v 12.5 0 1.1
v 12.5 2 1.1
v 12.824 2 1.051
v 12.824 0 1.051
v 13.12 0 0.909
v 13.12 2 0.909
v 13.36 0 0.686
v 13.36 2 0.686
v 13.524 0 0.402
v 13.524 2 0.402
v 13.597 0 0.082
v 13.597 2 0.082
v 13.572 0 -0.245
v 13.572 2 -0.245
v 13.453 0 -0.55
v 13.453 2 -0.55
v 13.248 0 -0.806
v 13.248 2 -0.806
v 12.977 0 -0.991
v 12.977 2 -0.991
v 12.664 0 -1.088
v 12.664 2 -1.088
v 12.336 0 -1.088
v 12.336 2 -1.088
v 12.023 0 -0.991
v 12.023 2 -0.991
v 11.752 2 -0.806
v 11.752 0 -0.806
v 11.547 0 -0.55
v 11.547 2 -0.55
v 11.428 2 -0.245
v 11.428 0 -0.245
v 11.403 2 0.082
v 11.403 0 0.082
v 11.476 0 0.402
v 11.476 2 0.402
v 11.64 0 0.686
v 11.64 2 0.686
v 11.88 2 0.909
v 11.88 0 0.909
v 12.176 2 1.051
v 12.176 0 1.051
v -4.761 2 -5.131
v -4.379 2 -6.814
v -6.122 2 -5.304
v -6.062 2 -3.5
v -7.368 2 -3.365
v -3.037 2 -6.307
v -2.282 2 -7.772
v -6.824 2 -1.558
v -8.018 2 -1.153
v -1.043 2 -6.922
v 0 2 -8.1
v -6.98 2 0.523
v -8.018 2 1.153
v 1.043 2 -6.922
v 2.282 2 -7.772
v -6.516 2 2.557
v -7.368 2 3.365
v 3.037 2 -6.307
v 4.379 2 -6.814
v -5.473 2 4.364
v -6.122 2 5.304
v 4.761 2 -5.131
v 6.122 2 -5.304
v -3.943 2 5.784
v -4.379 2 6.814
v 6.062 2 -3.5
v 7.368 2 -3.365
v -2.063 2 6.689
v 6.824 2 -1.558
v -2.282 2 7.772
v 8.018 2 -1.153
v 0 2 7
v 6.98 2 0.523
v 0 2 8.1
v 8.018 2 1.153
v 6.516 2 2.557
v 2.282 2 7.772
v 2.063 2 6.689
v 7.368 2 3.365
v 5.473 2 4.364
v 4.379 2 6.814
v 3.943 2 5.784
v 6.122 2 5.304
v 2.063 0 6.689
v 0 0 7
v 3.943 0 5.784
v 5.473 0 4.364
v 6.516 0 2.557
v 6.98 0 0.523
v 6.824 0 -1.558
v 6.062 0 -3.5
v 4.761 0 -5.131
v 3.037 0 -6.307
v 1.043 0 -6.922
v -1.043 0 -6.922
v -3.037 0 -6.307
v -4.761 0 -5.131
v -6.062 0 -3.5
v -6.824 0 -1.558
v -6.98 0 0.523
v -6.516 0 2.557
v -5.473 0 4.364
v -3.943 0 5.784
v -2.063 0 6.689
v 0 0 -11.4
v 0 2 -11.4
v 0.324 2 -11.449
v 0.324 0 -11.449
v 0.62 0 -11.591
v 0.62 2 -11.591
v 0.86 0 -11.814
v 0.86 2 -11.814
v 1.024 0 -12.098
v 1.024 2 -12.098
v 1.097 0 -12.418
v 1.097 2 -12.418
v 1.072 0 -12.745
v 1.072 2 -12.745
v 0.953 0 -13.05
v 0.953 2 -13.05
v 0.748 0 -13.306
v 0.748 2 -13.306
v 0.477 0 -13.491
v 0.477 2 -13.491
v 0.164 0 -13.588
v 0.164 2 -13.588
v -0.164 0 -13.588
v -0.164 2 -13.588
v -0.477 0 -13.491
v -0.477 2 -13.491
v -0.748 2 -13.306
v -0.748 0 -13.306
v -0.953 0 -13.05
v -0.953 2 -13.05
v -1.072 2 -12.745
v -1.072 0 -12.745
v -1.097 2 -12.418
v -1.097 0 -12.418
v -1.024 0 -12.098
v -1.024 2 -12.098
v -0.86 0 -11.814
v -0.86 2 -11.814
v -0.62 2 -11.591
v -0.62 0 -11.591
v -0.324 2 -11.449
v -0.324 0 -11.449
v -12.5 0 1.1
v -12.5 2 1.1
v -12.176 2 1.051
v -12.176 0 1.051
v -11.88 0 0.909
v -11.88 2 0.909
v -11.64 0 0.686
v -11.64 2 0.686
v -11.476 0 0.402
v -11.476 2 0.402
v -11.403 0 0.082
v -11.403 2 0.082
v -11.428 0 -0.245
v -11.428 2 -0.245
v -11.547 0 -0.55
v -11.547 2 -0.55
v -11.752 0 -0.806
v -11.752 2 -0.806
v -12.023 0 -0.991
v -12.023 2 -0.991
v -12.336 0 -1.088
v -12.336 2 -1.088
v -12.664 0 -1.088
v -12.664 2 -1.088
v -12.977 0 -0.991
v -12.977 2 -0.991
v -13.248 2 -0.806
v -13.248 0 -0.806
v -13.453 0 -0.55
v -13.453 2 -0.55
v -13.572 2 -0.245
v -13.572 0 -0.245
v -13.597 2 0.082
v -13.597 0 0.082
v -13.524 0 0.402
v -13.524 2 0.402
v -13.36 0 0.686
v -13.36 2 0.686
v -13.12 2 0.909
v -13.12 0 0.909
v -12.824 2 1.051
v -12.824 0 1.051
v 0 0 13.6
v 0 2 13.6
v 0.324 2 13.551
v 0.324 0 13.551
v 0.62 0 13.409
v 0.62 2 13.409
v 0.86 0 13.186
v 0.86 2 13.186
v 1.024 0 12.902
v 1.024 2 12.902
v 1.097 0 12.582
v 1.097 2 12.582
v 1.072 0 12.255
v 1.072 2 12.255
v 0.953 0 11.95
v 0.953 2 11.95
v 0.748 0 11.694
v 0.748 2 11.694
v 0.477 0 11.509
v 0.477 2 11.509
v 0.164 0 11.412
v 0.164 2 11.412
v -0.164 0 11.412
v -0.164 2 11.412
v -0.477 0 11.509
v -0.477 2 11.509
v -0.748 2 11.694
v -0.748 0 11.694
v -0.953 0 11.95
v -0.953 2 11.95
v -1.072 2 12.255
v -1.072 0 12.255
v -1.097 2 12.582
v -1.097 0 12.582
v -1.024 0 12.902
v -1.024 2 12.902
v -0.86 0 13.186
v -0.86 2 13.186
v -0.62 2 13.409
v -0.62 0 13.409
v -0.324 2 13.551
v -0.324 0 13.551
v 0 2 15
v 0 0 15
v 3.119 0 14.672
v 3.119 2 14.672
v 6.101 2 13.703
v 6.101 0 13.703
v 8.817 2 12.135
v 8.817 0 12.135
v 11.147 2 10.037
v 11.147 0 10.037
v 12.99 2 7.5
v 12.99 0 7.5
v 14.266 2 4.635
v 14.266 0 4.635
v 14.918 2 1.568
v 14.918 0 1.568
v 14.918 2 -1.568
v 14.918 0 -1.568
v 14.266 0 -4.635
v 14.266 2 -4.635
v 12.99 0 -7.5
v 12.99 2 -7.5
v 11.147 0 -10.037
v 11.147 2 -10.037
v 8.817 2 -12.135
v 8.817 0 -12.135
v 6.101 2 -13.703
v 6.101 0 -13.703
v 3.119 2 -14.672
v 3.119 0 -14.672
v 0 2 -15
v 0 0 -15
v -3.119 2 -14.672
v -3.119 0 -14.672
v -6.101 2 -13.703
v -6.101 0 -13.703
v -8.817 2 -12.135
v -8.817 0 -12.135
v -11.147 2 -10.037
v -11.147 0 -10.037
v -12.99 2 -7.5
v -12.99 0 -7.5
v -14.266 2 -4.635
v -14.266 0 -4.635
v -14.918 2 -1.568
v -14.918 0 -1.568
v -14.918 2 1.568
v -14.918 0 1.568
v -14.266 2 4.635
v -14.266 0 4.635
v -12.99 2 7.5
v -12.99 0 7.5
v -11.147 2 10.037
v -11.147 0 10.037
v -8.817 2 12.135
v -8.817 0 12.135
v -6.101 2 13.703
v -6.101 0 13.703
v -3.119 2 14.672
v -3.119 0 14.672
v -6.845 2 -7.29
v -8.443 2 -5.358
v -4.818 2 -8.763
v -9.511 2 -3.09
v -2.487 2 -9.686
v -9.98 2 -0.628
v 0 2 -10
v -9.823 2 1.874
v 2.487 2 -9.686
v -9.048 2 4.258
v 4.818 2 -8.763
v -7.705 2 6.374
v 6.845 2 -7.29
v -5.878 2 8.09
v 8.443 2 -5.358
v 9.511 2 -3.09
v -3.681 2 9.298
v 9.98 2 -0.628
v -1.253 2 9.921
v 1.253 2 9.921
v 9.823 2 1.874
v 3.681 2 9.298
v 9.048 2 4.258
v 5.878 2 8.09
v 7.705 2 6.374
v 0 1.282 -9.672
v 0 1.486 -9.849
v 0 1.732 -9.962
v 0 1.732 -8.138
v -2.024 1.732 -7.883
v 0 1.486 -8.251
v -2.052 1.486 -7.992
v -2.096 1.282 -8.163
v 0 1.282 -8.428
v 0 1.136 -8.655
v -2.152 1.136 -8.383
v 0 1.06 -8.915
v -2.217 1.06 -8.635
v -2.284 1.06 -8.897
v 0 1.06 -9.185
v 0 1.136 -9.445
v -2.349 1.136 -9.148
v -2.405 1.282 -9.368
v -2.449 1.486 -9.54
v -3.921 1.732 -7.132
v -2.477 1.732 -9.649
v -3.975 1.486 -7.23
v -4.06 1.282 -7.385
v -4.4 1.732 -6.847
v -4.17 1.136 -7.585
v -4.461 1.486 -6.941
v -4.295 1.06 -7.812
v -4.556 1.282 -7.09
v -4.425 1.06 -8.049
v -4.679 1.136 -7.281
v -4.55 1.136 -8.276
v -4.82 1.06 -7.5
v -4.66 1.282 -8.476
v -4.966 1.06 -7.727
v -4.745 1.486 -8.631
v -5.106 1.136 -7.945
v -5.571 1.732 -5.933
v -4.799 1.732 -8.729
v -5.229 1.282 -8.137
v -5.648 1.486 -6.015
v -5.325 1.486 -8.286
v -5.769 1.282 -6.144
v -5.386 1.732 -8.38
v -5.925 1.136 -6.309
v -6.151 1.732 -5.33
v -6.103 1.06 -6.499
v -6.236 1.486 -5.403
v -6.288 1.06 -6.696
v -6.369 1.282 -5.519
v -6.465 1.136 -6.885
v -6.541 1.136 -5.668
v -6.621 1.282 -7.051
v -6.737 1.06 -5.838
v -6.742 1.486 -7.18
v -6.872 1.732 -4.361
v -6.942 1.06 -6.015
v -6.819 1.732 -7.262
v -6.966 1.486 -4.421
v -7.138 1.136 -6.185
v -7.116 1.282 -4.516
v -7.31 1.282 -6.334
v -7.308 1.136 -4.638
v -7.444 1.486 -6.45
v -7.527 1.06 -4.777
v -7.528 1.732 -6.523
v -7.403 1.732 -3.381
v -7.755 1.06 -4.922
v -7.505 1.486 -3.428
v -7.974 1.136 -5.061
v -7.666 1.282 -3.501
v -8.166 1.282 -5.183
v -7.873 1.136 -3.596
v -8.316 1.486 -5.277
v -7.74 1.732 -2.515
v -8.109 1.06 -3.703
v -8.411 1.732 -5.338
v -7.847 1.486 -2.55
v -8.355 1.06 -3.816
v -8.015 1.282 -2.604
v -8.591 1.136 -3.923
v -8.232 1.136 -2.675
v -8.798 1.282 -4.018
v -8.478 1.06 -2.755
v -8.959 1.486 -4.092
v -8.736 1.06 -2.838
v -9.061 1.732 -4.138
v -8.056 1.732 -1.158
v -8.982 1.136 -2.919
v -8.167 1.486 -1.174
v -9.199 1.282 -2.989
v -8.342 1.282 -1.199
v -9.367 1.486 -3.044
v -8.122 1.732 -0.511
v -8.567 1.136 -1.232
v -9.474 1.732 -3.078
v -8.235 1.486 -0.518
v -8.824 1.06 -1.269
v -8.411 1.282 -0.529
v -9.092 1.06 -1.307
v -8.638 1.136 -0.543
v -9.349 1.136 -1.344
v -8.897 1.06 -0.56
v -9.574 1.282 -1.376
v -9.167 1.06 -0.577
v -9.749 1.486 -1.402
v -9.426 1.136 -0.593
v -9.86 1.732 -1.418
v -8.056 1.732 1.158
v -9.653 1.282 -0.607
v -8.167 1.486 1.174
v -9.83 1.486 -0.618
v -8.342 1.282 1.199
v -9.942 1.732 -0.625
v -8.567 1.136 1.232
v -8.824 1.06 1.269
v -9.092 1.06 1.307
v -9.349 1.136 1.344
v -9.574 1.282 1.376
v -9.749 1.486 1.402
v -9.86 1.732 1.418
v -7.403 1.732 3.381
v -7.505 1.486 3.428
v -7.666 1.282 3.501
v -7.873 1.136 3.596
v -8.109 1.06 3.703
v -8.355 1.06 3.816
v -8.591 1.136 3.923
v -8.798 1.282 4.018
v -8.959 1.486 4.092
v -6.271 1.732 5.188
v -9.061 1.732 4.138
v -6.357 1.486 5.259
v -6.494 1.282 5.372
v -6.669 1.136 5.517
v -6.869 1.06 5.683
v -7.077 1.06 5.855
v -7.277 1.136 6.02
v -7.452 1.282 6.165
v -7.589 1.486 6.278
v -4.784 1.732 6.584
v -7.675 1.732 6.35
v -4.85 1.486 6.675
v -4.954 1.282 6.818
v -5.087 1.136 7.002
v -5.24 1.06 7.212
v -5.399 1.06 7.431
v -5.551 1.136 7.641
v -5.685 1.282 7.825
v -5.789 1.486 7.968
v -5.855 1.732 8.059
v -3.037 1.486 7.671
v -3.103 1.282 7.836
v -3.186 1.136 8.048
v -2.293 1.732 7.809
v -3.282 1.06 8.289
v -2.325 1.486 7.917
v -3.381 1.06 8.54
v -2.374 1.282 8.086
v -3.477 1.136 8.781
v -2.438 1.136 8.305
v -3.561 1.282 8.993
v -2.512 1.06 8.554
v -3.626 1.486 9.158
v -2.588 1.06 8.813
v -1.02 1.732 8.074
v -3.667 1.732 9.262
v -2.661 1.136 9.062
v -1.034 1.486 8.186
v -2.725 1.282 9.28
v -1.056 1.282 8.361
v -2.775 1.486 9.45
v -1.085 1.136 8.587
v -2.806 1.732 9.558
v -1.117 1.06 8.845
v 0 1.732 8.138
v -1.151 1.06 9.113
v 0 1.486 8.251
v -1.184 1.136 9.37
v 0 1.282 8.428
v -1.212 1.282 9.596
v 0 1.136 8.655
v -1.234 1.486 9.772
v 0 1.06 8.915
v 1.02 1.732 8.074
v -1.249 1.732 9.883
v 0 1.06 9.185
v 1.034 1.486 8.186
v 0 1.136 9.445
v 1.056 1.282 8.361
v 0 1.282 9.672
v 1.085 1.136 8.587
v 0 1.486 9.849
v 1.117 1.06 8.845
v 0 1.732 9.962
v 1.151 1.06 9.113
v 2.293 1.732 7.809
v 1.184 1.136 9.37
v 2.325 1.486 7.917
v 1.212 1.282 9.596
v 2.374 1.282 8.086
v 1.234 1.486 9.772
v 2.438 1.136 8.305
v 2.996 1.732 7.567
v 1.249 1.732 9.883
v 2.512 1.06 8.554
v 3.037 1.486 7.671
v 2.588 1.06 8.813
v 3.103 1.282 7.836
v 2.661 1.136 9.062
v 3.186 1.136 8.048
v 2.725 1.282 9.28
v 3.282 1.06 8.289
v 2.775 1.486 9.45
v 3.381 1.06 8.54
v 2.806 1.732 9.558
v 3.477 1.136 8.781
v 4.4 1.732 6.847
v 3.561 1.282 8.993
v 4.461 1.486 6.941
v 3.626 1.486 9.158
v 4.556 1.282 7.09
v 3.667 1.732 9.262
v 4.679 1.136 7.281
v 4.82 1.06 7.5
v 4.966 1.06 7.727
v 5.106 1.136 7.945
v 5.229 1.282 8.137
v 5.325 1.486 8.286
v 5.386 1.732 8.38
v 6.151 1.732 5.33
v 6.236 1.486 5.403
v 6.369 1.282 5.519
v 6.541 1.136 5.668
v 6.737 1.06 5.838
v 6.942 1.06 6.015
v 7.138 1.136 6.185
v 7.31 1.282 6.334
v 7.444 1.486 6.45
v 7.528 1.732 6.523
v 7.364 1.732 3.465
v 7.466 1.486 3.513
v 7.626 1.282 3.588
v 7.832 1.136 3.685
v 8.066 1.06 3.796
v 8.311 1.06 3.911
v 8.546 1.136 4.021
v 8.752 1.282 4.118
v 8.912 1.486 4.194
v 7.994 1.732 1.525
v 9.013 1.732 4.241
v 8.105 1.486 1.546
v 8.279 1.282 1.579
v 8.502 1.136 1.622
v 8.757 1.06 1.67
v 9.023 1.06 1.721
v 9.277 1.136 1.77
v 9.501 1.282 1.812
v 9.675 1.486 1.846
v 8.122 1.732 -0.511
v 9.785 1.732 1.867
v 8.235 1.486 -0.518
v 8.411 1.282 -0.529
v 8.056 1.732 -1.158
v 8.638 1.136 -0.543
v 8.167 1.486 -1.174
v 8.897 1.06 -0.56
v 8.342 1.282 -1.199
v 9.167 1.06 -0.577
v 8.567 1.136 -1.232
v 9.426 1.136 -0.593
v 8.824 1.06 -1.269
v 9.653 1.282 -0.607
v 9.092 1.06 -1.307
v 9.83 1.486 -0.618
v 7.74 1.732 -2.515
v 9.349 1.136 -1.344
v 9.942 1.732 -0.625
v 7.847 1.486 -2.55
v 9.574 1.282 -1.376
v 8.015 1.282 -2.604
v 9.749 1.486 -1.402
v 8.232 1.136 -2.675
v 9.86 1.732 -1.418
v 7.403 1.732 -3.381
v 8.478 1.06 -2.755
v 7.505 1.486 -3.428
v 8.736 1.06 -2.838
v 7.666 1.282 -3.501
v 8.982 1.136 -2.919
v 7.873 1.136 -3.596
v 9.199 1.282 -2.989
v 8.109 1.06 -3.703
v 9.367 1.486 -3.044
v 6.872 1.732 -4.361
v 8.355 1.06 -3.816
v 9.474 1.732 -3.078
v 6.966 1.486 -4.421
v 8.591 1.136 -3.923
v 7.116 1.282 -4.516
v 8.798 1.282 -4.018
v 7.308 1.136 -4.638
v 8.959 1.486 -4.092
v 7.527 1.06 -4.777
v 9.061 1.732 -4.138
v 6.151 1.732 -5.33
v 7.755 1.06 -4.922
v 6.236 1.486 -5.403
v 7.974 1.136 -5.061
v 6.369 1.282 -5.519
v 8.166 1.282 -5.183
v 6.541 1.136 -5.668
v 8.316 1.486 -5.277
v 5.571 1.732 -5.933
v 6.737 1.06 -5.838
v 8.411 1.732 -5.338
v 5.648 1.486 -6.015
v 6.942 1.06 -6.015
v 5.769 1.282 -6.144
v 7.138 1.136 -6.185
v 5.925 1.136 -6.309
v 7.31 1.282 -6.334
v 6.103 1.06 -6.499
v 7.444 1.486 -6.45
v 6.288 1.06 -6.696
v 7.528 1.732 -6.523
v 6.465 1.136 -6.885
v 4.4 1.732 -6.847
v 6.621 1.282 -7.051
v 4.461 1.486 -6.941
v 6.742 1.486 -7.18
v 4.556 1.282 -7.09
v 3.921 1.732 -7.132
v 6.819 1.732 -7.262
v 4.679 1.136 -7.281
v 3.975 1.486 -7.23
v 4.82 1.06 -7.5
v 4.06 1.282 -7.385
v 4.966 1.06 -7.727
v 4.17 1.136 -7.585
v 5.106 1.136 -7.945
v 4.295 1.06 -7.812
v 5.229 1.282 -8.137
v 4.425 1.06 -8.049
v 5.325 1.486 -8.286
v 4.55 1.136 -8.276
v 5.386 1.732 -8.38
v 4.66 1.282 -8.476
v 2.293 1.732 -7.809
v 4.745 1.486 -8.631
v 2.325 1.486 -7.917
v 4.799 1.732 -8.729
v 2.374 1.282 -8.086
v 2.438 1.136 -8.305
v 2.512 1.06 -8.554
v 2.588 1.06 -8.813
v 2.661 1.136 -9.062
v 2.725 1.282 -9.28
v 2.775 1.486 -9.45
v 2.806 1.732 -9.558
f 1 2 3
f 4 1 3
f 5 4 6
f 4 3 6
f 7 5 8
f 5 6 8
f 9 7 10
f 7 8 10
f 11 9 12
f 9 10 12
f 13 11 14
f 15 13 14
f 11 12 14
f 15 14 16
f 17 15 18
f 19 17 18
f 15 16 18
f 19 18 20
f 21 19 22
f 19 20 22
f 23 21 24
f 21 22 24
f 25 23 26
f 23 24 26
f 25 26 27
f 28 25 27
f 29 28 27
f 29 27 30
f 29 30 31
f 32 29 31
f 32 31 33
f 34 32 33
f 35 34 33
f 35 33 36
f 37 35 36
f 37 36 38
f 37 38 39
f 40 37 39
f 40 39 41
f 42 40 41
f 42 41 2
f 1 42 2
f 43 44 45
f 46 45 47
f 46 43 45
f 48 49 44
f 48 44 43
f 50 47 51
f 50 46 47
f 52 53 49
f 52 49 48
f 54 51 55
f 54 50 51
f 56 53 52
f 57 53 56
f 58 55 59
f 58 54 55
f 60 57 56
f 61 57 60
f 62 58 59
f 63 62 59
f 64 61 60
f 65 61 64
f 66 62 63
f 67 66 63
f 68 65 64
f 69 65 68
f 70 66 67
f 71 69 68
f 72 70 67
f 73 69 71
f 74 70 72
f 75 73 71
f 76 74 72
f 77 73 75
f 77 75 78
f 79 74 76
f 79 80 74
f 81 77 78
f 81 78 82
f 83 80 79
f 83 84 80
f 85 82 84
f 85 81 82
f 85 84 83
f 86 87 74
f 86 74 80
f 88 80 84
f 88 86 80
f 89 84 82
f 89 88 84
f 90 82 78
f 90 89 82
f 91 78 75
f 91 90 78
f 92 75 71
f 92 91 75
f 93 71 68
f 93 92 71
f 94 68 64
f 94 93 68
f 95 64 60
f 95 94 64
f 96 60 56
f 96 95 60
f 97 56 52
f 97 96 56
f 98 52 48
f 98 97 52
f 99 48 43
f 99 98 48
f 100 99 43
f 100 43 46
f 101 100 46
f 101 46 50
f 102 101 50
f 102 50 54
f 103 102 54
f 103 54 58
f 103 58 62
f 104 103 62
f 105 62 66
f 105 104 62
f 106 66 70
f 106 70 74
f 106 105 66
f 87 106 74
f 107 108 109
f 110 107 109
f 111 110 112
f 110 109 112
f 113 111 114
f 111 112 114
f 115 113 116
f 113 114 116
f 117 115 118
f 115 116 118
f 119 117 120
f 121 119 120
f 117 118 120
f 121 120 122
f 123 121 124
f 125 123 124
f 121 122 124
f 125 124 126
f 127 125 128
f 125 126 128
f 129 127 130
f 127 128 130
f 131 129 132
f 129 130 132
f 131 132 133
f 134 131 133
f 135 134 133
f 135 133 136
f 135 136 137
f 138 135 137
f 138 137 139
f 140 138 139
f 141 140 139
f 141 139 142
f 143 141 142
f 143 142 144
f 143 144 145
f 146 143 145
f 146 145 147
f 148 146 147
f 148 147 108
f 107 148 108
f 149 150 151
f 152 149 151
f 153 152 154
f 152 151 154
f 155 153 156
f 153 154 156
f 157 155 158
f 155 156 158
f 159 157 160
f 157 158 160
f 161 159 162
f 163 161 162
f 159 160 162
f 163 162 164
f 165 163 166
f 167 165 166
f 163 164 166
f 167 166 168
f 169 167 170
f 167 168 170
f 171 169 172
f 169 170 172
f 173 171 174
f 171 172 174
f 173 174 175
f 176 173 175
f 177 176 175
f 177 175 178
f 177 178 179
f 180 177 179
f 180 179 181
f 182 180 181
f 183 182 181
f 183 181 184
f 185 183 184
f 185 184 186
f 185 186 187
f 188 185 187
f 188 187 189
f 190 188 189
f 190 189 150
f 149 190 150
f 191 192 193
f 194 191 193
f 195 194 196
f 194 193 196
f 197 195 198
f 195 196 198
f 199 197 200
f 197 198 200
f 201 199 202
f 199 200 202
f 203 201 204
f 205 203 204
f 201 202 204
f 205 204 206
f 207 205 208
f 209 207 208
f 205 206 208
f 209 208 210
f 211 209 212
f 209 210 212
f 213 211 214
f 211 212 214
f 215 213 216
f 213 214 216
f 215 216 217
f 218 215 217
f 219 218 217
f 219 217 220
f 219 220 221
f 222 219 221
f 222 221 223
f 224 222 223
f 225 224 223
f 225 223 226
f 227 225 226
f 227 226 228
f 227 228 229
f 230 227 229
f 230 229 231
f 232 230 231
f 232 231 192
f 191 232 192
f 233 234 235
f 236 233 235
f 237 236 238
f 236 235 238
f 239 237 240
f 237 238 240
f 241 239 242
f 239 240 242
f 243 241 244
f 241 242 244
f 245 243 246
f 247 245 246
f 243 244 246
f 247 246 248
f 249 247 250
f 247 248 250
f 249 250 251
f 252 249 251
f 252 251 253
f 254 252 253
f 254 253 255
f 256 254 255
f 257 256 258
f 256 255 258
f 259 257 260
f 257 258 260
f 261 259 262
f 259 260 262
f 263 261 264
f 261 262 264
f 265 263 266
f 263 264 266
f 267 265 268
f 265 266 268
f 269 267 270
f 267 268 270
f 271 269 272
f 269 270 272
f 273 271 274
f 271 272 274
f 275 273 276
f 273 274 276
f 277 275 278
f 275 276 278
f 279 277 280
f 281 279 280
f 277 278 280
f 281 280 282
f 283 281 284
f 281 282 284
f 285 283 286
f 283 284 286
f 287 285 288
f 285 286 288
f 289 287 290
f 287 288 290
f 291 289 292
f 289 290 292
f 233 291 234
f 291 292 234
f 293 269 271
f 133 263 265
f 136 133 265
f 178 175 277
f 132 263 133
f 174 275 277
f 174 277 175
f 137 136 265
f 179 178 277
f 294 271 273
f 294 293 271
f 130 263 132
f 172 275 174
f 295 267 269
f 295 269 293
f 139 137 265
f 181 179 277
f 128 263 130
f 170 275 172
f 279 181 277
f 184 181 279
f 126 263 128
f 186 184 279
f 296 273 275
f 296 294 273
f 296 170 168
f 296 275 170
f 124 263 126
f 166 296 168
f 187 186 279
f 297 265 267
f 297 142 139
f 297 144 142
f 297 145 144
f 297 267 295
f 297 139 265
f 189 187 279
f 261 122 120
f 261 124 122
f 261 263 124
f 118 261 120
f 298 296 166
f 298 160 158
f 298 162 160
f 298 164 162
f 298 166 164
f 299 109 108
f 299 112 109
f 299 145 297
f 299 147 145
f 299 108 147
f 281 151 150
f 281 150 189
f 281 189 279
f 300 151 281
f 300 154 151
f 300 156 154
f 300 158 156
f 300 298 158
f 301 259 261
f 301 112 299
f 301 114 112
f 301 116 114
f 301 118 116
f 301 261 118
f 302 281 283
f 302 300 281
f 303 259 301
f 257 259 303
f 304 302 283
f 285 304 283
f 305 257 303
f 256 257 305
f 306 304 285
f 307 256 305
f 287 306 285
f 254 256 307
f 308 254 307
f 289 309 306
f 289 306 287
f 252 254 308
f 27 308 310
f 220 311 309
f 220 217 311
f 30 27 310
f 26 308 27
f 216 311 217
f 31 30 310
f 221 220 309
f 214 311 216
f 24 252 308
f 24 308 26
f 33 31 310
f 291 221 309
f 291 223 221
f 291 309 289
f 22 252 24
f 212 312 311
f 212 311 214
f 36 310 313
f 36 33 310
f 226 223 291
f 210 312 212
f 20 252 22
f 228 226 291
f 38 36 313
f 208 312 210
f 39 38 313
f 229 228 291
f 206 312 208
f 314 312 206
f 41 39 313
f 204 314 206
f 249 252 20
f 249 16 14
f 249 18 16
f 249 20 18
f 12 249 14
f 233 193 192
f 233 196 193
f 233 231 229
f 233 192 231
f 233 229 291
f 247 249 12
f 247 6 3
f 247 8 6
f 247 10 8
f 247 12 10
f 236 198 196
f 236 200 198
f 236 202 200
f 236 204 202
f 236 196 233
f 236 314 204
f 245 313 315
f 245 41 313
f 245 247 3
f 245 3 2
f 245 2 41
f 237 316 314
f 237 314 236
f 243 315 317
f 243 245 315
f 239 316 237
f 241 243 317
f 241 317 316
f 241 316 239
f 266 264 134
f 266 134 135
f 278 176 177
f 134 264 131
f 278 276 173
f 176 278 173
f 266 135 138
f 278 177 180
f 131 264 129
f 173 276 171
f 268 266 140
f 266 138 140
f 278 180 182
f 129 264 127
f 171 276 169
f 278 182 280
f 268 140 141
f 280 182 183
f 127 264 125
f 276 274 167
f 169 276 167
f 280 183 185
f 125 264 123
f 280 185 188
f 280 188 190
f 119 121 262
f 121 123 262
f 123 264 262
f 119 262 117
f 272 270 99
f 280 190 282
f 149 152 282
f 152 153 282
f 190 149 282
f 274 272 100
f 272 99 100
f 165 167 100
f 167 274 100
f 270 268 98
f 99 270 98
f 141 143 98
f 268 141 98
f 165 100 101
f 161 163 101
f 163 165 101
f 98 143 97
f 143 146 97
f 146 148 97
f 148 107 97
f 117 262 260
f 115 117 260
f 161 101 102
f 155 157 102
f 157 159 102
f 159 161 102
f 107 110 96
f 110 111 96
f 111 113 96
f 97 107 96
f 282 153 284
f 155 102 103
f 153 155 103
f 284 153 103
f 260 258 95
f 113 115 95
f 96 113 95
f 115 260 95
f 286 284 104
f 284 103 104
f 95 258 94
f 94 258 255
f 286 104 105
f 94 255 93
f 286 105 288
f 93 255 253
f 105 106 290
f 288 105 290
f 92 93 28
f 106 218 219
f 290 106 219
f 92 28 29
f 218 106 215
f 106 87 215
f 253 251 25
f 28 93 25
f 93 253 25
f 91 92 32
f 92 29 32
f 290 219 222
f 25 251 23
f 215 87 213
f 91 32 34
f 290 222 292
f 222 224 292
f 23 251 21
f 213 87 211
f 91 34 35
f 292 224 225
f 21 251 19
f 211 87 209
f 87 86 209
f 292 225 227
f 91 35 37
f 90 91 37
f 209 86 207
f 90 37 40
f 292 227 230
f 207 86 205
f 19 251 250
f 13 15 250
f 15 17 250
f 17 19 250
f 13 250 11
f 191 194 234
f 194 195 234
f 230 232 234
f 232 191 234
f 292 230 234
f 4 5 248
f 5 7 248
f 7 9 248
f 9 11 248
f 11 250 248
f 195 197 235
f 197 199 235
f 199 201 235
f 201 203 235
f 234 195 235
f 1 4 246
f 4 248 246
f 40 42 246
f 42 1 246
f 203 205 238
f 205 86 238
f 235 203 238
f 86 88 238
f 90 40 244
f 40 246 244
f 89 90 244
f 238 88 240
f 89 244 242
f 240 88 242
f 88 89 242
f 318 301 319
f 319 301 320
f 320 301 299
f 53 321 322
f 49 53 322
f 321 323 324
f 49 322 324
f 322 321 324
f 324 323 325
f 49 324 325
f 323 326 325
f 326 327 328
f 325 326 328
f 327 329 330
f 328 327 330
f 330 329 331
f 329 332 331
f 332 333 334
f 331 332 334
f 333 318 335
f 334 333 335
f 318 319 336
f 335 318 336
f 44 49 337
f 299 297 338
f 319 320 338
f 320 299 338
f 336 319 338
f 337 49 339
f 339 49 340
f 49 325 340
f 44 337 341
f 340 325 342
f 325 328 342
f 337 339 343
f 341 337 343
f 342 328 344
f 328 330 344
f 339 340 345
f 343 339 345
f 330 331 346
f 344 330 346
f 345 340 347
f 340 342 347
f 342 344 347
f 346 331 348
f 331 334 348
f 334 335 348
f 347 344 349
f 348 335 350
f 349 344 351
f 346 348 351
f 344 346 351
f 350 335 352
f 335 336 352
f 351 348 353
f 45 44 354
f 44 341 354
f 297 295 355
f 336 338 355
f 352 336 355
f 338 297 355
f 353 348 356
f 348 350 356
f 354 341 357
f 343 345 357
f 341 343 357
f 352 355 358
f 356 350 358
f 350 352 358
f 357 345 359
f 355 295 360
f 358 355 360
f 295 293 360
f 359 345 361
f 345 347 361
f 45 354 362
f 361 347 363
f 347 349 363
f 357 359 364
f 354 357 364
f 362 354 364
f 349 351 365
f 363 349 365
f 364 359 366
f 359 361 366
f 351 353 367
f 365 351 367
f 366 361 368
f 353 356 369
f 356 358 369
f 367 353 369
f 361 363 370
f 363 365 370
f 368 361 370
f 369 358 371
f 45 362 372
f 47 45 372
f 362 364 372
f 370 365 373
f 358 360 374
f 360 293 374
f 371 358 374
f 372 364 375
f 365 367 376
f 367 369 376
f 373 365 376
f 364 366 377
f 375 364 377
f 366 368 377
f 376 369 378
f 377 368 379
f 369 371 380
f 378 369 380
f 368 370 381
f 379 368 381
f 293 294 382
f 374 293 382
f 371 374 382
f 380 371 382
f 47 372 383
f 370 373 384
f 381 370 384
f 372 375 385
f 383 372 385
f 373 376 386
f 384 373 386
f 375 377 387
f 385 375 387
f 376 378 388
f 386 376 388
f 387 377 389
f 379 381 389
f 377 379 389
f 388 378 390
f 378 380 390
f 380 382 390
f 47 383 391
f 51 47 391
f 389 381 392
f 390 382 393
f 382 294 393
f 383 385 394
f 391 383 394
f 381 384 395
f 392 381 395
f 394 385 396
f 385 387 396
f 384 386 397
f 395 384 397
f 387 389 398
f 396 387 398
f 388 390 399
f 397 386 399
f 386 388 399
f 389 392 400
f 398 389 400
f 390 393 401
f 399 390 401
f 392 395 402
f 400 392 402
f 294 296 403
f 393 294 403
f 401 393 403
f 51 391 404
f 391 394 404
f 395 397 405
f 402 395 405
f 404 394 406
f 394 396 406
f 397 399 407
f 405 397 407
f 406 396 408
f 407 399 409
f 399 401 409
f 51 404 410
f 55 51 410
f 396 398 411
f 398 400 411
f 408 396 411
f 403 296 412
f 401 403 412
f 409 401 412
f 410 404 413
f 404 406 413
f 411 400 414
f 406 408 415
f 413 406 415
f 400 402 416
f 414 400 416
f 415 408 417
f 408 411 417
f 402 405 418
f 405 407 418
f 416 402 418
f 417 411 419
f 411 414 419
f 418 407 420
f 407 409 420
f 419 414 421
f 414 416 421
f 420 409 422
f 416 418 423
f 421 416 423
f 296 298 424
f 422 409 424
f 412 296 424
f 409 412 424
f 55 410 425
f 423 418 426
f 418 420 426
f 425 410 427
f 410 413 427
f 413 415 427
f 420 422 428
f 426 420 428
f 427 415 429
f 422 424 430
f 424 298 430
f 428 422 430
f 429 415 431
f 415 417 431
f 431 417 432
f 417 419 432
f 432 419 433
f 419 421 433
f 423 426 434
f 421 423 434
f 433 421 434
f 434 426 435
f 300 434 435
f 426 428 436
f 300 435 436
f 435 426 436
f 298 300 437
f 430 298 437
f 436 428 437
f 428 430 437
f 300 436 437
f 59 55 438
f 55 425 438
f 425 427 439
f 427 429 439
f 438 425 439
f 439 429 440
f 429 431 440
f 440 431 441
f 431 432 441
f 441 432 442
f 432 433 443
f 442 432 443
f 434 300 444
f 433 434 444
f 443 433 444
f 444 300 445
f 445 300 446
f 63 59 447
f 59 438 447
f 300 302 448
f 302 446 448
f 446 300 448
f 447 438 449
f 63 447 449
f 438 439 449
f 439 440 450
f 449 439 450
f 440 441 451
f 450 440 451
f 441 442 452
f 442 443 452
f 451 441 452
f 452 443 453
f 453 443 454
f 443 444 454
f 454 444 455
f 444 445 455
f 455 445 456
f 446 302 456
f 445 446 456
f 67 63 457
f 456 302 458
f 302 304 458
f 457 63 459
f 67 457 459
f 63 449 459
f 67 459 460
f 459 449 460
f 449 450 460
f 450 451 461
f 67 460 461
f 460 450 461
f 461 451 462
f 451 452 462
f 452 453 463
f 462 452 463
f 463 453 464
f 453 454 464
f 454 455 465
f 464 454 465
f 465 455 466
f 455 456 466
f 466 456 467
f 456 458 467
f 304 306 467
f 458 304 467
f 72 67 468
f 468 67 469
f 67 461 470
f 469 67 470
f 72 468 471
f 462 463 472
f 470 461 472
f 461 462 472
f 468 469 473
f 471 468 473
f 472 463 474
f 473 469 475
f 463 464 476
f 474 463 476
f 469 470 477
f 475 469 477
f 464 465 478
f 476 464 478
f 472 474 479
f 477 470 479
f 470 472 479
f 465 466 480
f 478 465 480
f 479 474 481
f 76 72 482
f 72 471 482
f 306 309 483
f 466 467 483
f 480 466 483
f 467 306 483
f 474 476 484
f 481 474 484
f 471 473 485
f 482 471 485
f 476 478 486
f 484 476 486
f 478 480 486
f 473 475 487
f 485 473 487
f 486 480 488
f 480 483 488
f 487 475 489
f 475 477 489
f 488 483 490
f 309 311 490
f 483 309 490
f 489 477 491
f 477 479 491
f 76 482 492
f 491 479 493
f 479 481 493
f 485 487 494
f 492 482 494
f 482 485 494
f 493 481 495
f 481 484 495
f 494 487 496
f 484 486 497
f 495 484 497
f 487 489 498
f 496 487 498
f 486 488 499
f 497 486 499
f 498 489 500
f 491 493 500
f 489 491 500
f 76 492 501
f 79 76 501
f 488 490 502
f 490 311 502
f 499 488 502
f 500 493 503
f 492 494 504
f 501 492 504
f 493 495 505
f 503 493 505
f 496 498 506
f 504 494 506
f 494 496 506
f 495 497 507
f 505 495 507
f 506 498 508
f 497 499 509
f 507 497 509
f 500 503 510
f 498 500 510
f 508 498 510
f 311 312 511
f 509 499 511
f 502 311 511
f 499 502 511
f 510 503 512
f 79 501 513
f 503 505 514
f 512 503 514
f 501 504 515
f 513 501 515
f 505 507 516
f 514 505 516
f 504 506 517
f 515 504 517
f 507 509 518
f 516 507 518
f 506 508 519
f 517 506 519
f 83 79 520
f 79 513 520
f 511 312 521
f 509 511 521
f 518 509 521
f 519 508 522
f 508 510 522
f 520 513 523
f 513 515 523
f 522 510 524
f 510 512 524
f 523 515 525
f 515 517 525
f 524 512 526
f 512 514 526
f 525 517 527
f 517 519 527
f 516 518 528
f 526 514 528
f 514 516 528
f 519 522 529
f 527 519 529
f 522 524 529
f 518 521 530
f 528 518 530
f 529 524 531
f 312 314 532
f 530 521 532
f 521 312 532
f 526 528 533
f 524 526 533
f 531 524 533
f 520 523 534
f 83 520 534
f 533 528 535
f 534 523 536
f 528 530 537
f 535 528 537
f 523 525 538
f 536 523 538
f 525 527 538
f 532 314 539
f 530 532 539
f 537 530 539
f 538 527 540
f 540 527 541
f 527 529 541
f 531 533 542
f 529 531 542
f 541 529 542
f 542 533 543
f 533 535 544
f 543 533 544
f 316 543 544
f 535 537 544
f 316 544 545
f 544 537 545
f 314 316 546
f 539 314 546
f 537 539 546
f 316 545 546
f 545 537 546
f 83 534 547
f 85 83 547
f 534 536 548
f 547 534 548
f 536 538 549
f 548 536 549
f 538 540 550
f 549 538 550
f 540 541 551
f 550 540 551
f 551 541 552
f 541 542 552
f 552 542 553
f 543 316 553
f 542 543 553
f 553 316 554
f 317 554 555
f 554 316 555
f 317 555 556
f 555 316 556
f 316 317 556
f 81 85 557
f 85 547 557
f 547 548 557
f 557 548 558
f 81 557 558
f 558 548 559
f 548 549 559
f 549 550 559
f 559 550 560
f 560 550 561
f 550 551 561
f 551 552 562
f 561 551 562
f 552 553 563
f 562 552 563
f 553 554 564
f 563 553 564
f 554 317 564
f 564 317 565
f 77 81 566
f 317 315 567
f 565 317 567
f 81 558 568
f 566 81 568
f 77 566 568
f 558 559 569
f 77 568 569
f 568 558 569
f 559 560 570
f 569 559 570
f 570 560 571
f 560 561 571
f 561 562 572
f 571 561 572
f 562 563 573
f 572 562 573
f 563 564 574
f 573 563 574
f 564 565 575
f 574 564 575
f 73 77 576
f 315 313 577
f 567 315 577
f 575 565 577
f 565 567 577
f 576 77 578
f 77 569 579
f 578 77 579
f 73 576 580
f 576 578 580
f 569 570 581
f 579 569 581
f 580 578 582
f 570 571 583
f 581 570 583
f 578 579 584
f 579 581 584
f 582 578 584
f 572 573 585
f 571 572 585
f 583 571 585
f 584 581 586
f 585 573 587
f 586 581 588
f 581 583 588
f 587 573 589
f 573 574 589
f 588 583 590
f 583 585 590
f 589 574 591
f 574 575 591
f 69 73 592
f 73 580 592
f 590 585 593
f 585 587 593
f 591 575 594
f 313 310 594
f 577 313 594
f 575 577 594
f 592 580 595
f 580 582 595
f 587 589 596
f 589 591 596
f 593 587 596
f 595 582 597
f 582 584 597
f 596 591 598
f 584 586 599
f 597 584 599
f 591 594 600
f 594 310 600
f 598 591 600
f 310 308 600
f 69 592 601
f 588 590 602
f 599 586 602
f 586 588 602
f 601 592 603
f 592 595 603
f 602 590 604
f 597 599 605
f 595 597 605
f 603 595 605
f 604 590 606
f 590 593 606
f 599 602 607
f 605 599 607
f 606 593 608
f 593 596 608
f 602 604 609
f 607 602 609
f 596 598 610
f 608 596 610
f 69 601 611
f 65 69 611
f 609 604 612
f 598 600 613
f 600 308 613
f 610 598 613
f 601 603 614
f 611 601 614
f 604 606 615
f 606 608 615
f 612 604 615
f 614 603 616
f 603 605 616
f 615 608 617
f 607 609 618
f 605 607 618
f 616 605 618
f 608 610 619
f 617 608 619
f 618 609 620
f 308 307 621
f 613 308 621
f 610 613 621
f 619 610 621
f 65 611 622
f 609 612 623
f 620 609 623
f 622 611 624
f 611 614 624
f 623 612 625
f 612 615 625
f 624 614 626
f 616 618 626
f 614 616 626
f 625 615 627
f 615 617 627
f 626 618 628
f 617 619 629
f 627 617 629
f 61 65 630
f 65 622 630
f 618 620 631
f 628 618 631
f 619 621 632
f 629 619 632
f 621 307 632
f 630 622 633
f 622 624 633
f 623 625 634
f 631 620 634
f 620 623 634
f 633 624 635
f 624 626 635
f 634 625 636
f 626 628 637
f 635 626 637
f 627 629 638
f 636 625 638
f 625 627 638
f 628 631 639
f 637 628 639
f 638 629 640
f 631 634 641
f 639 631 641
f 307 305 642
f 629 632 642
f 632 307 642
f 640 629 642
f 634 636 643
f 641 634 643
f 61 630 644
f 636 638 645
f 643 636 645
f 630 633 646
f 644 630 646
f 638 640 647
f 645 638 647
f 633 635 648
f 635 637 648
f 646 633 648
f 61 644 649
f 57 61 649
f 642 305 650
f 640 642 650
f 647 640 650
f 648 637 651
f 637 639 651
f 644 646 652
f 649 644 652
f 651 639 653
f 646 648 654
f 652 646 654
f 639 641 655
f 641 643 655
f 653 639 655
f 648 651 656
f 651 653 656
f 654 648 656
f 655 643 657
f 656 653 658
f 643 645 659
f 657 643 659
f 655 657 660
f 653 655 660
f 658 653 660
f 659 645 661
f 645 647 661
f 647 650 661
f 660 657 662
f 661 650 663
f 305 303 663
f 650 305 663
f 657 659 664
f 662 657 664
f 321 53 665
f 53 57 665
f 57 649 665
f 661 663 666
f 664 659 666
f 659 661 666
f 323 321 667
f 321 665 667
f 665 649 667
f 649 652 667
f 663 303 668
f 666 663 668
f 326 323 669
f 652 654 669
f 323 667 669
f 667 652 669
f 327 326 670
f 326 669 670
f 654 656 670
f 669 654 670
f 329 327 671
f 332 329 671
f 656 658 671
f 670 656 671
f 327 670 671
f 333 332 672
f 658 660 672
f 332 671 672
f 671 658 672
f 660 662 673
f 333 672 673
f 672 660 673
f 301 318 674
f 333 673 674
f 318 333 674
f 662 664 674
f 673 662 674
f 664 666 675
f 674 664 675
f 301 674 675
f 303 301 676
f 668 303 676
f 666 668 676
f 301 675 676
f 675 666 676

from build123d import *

# Parameters (mm, degrees)
SKETCH_1_R          = 15
SKETCH_1_R_2        = 7
EXTRUDE_1_DEPTH     = 2
CUT_EXTRUDE_1_REACH = 23.307
SKETCH_2_R          = 1.1
SKETCH_3_R          = 0.95


with BuildPart() as part:
    # 草图1 → 凸台-拉伸1 (new body)
    with BuildSketch(Plane(origin=(0, 0, 0), x_dir=(1, 0, 0), z_dir=(0, 1, 0))):
        with Locations(Location((0, 0, 0), (0, 0, 270))):
            Circle(SKETCH_1_R)
        with Locations(Location((0, 0, 0), (0, 0, 270))):
            Circle(SKETCH_1_R_2, mode=Mode.SUBTRACT)
    extrude(amount=EXTRUDE_1_DEPTH)

    # 草图2 → 切除-拉伸1 (cut, up to next)
    with BuildSketch(Plane(origin=(0, 2, 0), x_dir=(1, 0, 0), z_dir=(0, 1, 0)), mode=Mode.PRIVATE) as cut_extrude_1_sk1:
        with Locations(Location((12.5, 0, 0), (0, 0, 270))):
            Circle(SKETCH_2_R)
    cut_extrude_1_tool1 = extrude(cut_extrude_1_sk1.sketch, amount=-CUT_EXTRUDE_1_REACH, mode=Mode.PRIVATE) & part.part
    # 草图2 → 切除-拉伸1 (cut, up to next)
    with BuildSketch(Plane(origin=(0, 2, 0), x_dir=(1, 0, 0), z_dir=(0, 1, 0)), mode=Mode.PRIVATE) as cut_extrude_1_sk2:
        with Locations(Location((0, -12.5, 0), (0, 0, 270))):
            Circle(SKETCH_2_R)
    cut_extrude_1_tool2 = extrude(cut_extrude_1_sk2.sketch, amount=-CUT_EXTRUDE_1_REACH, mode=Mode.PRIVATE) & part.part
    # 草图2 → 切除-拉伸1 (cut, up to next)
    with BuildSketch(Plane(origin=(0, 2, 0), x_dir=(1, 0, 0), z_dir=(0, 1, 0)), mode=Mode.PRIVATE) as cut_extrude_1_sk3:
        with Locations(Location((-12.5, 0, 0), (0, 0, 270))):
            Circle(SKETCH_2_R)
    cut_extrude_1_tool3 = extrude(cut_extrude_1_sk3.sketch, amount=-CUT_EXTRUDE_1_REACH, mode=Mode.PRIVATE) & part.part
    # 草图2 → 切除-拉伸1 (cut, up to next)
    with BuildSketch(Plane(origin=(0, 2, 0), x_dir=(1, 0, 0), z_dir=(0, 1, 0)), mode=Mode.PRIVATE) as cut_extrude_1_sk4:
        with Locations(Location((0, 12.5, 0), (0, 0, 270))):
            Circle(SKETCH_2_R)
    cut_extrude_1_tool4 = extrude(cut_extrude_1_sk4.sketch, amount=-CUT_EXTRUDE_1_REACH, mode=Mode.PRIVATE) & part.part
    add(cut_extrude_1_tool1.solids().sort_by_distance((12.5, 2, 0))[0], mode=Mode.SUBTRACT)
    add(cut_extrude_1_tool2.solids().sort_by_distance((0, 2, 12.5))[0], mode=Mode.SUBTRACT)
    add(cut_extrude_1_tool3.solids().sort_by_distance((-12.5, 2, 0))[0], mode=Mode.SUBTRACT)
    add(cut_extrude_1_tool4.solids().sort_by_distance((0, 2, -12.5))[0], mode=Mode.SUBTRACT)

    # 草图3 → 切除-旋转1 (revolve, cut)
    with BuildSketch(Plane.XY, mode=Mode.PRIVATE) as cut_revolve_1_sk:
        with Locations((9.05, 2)):
            Circle(SKETCH_3_R)
    revolve(cut_revolve_1_sk.sketch.rotate(Axis((0, 2, 0), (0, 1, 0)), 90), axis=Axis((0, 2, 0), (0, 1, 0)), mode=Mode.SUBTRACT)


solid = part.part
